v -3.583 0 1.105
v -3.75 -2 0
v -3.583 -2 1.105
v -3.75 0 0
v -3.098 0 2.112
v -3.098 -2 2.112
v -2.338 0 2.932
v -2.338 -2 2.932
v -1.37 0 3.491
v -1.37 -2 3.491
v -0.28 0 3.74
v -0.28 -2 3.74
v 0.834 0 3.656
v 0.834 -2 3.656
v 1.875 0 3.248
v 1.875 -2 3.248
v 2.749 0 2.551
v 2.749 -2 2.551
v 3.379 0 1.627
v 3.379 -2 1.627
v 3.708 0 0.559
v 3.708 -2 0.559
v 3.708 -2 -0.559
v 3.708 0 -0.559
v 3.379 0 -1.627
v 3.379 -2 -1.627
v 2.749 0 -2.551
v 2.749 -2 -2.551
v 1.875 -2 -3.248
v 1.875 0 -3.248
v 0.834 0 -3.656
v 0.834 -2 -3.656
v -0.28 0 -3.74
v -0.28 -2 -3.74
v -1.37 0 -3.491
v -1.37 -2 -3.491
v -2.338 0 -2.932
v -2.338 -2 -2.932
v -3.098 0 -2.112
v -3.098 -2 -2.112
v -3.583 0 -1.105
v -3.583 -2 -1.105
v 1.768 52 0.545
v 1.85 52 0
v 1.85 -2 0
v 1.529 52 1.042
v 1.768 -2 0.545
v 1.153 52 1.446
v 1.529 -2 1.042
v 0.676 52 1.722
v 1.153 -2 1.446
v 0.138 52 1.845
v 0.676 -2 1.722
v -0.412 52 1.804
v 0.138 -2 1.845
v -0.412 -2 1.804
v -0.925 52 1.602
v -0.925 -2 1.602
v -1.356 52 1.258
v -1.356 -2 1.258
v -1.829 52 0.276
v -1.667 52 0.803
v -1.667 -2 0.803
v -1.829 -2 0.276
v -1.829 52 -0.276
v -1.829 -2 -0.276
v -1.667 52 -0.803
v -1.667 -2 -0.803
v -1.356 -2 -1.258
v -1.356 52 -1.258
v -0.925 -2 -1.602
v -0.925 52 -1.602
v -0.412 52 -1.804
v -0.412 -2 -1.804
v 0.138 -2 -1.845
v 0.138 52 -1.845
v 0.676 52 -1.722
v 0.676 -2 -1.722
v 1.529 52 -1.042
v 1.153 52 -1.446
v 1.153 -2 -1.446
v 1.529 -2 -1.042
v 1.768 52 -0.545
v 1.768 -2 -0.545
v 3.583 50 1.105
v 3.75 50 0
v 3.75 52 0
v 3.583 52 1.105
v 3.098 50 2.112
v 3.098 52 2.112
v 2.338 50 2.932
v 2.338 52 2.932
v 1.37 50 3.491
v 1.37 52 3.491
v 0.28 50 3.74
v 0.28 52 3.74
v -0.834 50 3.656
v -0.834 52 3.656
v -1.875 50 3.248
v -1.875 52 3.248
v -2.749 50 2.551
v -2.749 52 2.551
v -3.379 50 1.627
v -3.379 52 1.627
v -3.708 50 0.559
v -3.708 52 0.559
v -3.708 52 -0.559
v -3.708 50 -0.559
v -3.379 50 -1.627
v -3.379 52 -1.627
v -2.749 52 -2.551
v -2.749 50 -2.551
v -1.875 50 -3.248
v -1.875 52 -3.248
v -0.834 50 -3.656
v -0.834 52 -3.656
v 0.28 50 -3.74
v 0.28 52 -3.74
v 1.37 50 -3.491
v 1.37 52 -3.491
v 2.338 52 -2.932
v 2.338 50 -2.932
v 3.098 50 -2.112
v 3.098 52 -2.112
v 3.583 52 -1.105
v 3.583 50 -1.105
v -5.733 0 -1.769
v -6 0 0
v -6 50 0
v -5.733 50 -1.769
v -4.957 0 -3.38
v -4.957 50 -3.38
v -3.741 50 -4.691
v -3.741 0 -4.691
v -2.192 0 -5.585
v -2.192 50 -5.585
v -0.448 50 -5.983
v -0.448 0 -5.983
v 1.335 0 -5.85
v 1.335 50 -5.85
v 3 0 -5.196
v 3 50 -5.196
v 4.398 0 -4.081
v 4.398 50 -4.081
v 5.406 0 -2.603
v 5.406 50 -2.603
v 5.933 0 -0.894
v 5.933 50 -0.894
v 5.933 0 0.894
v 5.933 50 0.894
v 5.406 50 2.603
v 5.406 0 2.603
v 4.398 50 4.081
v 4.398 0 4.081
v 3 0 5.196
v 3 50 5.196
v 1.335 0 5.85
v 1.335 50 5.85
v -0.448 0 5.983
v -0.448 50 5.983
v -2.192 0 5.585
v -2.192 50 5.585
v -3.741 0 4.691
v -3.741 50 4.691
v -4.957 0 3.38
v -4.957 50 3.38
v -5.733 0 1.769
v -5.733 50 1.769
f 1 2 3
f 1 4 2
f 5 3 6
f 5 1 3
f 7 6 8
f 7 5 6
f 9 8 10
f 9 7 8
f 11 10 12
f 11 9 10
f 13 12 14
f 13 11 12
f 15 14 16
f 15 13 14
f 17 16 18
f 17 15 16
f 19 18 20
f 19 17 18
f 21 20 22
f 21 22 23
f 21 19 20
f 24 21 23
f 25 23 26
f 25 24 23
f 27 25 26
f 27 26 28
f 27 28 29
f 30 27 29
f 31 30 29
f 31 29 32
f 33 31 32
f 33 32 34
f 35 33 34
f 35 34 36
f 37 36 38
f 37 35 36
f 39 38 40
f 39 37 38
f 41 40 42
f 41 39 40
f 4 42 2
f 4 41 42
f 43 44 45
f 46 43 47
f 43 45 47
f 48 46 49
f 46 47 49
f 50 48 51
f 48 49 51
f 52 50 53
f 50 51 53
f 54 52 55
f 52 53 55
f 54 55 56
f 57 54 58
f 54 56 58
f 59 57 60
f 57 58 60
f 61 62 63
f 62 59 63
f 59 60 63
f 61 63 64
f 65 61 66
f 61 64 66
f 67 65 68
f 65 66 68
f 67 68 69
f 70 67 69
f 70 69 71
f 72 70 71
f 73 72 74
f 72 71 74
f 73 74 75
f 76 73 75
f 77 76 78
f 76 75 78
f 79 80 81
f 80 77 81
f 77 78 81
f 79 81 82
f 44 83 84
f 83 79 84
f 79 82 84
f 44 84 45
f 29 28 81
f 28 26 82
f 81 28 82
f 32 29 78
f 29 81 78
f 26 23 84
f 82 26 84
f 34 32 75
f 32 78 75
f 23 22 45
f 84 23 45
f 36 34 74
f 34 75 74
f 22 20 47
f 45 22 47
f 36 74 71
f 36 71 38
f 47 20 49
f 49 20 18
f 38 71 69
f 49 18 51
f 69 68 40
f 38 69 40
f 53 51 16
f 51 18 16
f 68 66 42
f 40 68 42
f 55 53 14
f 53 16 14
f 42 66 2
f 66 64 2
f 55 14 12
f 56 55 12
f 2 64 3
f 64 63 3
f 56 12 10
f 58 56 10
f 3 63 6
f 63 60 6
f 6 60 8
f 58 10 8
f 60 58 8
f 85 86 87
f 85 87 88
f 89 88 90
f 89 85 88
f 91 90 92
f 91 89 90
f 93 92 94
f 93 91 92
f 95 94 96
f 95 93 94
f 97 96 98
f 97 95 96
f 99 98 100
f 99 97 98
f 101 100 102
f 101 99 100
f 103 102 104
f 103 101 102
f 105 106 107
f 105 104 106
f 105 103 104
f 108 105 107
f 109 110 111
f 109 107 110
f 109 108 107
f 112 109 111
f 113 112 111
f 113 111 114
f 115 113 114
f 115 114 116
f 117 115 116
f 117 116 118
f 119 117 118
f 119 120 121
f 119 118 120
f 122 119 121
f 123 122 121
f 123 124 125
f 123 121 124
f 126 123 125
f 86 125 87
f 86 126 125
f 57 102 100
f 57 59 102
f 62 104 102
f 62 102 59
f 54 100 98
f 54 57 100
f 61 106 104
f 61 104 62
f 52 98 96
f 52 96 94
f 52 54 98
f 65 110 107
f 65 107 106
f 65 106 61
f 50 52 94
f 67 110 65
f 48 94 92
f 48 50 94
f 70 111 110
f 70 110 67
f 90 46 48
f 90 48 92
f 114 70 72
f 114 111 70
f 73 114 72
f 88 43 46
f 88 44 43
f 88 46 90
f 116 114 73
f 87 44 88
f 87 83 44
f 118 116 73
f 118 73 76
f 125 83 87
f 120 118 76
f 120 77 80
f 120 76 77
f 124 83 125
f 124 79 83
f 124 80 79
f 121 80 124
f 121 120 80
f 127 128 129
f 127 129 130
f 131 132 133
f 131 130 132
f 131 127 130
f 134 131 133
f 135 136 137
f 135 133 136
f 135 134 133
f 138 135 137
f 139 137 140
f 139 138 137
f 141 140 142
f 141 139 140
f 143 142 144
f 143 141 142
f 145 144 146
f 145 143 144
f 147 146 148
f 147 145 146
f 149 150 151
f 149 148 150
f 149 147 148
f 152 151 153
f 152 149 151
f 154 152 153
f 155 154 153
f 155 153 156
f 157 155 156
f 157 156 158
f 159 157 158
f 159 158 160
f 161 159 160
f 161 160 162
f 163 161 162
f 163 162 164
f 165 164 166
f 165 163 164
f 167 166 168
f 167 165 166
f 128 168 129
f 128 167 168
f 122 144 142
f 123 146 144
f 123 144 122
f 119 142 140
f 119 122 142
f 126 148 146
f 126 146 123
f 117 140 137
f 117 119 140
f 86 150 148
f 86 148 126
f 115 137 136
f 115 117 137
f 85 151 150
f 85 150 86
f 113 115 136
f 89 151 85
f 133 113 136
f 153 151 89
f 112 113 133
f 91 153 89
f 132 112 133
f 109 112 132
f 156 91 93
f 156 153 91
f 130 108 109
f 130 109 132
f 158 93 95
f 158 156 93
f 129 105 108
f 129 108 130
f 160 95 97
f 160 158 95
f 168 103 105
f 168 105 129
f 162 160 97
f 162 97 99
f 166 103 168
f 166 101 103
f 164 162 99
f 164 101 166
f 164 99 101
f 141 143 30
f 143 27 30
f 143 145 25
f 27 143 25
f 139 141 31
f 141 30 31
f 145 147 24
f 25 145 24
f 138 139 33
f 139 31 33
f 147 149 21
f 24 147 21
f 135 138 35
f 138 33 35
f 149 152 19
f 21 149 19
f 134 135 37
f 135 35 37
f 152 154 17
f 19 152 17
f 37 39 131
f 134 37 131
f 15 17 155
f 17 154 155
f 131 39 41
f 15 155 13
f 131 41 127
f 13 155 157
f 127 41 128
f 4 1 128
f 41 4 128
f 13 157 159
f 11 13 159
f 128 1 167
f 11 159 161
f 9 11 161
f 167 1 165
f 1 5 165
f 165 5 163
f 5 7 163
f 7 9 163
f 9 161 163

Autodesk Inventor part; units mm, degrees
ref_plane "YZ Plane" through (0, 0, 0) normal (1, 0, 0) x (0, 1, 0)
ref_plane "XZ Plane" through (0, 0, 0) normal (0, 1, 0) x (-1, 0, 0)
ref_plane "XY Plane" through (0, 0, 0) normal (0, 0, 1) x (1, 0, 0)
sketch "Sketch1" plane through (0, 0, 0) normal (0, 1, 0) x (-1, 0, 0)
  circle A0 centre (0, 0) radius 3.75
  circle A1 centre (0, 0) radius 6
  dimension "d0" = 7.5
  dimension "d1" = 12
extrude "Extrusion1" add sketch "Sketch1" along normal blind 50 contours A0 | A1
extrude "Extrusion2" add sketch "Sketch1" against normal blind 2 contours A0
sketch "Sketch2" plane through (0, -2, 0) normal (0, -1, 0) x (1, 0, 0)
  circle A0 centre (0, 0) radius 1.85
  dimension "d6" = 3.7
extrude "Extrusion3" cut sketch "Sketch2" against normal blind 600
sketch "Sketch3" plane through (0, 50, 0) normal (0, 1, 0) x (1, 0, 0)
  circle A0 centre (0, 0) radius 1.85 projected
  circle A1 centre (0, 0) radius 3.75
  dimension "d9" = 7.5
extrude "Extrusion4" add sketch "Sketch3" along normal blind 2
properties part number "extendo1"
